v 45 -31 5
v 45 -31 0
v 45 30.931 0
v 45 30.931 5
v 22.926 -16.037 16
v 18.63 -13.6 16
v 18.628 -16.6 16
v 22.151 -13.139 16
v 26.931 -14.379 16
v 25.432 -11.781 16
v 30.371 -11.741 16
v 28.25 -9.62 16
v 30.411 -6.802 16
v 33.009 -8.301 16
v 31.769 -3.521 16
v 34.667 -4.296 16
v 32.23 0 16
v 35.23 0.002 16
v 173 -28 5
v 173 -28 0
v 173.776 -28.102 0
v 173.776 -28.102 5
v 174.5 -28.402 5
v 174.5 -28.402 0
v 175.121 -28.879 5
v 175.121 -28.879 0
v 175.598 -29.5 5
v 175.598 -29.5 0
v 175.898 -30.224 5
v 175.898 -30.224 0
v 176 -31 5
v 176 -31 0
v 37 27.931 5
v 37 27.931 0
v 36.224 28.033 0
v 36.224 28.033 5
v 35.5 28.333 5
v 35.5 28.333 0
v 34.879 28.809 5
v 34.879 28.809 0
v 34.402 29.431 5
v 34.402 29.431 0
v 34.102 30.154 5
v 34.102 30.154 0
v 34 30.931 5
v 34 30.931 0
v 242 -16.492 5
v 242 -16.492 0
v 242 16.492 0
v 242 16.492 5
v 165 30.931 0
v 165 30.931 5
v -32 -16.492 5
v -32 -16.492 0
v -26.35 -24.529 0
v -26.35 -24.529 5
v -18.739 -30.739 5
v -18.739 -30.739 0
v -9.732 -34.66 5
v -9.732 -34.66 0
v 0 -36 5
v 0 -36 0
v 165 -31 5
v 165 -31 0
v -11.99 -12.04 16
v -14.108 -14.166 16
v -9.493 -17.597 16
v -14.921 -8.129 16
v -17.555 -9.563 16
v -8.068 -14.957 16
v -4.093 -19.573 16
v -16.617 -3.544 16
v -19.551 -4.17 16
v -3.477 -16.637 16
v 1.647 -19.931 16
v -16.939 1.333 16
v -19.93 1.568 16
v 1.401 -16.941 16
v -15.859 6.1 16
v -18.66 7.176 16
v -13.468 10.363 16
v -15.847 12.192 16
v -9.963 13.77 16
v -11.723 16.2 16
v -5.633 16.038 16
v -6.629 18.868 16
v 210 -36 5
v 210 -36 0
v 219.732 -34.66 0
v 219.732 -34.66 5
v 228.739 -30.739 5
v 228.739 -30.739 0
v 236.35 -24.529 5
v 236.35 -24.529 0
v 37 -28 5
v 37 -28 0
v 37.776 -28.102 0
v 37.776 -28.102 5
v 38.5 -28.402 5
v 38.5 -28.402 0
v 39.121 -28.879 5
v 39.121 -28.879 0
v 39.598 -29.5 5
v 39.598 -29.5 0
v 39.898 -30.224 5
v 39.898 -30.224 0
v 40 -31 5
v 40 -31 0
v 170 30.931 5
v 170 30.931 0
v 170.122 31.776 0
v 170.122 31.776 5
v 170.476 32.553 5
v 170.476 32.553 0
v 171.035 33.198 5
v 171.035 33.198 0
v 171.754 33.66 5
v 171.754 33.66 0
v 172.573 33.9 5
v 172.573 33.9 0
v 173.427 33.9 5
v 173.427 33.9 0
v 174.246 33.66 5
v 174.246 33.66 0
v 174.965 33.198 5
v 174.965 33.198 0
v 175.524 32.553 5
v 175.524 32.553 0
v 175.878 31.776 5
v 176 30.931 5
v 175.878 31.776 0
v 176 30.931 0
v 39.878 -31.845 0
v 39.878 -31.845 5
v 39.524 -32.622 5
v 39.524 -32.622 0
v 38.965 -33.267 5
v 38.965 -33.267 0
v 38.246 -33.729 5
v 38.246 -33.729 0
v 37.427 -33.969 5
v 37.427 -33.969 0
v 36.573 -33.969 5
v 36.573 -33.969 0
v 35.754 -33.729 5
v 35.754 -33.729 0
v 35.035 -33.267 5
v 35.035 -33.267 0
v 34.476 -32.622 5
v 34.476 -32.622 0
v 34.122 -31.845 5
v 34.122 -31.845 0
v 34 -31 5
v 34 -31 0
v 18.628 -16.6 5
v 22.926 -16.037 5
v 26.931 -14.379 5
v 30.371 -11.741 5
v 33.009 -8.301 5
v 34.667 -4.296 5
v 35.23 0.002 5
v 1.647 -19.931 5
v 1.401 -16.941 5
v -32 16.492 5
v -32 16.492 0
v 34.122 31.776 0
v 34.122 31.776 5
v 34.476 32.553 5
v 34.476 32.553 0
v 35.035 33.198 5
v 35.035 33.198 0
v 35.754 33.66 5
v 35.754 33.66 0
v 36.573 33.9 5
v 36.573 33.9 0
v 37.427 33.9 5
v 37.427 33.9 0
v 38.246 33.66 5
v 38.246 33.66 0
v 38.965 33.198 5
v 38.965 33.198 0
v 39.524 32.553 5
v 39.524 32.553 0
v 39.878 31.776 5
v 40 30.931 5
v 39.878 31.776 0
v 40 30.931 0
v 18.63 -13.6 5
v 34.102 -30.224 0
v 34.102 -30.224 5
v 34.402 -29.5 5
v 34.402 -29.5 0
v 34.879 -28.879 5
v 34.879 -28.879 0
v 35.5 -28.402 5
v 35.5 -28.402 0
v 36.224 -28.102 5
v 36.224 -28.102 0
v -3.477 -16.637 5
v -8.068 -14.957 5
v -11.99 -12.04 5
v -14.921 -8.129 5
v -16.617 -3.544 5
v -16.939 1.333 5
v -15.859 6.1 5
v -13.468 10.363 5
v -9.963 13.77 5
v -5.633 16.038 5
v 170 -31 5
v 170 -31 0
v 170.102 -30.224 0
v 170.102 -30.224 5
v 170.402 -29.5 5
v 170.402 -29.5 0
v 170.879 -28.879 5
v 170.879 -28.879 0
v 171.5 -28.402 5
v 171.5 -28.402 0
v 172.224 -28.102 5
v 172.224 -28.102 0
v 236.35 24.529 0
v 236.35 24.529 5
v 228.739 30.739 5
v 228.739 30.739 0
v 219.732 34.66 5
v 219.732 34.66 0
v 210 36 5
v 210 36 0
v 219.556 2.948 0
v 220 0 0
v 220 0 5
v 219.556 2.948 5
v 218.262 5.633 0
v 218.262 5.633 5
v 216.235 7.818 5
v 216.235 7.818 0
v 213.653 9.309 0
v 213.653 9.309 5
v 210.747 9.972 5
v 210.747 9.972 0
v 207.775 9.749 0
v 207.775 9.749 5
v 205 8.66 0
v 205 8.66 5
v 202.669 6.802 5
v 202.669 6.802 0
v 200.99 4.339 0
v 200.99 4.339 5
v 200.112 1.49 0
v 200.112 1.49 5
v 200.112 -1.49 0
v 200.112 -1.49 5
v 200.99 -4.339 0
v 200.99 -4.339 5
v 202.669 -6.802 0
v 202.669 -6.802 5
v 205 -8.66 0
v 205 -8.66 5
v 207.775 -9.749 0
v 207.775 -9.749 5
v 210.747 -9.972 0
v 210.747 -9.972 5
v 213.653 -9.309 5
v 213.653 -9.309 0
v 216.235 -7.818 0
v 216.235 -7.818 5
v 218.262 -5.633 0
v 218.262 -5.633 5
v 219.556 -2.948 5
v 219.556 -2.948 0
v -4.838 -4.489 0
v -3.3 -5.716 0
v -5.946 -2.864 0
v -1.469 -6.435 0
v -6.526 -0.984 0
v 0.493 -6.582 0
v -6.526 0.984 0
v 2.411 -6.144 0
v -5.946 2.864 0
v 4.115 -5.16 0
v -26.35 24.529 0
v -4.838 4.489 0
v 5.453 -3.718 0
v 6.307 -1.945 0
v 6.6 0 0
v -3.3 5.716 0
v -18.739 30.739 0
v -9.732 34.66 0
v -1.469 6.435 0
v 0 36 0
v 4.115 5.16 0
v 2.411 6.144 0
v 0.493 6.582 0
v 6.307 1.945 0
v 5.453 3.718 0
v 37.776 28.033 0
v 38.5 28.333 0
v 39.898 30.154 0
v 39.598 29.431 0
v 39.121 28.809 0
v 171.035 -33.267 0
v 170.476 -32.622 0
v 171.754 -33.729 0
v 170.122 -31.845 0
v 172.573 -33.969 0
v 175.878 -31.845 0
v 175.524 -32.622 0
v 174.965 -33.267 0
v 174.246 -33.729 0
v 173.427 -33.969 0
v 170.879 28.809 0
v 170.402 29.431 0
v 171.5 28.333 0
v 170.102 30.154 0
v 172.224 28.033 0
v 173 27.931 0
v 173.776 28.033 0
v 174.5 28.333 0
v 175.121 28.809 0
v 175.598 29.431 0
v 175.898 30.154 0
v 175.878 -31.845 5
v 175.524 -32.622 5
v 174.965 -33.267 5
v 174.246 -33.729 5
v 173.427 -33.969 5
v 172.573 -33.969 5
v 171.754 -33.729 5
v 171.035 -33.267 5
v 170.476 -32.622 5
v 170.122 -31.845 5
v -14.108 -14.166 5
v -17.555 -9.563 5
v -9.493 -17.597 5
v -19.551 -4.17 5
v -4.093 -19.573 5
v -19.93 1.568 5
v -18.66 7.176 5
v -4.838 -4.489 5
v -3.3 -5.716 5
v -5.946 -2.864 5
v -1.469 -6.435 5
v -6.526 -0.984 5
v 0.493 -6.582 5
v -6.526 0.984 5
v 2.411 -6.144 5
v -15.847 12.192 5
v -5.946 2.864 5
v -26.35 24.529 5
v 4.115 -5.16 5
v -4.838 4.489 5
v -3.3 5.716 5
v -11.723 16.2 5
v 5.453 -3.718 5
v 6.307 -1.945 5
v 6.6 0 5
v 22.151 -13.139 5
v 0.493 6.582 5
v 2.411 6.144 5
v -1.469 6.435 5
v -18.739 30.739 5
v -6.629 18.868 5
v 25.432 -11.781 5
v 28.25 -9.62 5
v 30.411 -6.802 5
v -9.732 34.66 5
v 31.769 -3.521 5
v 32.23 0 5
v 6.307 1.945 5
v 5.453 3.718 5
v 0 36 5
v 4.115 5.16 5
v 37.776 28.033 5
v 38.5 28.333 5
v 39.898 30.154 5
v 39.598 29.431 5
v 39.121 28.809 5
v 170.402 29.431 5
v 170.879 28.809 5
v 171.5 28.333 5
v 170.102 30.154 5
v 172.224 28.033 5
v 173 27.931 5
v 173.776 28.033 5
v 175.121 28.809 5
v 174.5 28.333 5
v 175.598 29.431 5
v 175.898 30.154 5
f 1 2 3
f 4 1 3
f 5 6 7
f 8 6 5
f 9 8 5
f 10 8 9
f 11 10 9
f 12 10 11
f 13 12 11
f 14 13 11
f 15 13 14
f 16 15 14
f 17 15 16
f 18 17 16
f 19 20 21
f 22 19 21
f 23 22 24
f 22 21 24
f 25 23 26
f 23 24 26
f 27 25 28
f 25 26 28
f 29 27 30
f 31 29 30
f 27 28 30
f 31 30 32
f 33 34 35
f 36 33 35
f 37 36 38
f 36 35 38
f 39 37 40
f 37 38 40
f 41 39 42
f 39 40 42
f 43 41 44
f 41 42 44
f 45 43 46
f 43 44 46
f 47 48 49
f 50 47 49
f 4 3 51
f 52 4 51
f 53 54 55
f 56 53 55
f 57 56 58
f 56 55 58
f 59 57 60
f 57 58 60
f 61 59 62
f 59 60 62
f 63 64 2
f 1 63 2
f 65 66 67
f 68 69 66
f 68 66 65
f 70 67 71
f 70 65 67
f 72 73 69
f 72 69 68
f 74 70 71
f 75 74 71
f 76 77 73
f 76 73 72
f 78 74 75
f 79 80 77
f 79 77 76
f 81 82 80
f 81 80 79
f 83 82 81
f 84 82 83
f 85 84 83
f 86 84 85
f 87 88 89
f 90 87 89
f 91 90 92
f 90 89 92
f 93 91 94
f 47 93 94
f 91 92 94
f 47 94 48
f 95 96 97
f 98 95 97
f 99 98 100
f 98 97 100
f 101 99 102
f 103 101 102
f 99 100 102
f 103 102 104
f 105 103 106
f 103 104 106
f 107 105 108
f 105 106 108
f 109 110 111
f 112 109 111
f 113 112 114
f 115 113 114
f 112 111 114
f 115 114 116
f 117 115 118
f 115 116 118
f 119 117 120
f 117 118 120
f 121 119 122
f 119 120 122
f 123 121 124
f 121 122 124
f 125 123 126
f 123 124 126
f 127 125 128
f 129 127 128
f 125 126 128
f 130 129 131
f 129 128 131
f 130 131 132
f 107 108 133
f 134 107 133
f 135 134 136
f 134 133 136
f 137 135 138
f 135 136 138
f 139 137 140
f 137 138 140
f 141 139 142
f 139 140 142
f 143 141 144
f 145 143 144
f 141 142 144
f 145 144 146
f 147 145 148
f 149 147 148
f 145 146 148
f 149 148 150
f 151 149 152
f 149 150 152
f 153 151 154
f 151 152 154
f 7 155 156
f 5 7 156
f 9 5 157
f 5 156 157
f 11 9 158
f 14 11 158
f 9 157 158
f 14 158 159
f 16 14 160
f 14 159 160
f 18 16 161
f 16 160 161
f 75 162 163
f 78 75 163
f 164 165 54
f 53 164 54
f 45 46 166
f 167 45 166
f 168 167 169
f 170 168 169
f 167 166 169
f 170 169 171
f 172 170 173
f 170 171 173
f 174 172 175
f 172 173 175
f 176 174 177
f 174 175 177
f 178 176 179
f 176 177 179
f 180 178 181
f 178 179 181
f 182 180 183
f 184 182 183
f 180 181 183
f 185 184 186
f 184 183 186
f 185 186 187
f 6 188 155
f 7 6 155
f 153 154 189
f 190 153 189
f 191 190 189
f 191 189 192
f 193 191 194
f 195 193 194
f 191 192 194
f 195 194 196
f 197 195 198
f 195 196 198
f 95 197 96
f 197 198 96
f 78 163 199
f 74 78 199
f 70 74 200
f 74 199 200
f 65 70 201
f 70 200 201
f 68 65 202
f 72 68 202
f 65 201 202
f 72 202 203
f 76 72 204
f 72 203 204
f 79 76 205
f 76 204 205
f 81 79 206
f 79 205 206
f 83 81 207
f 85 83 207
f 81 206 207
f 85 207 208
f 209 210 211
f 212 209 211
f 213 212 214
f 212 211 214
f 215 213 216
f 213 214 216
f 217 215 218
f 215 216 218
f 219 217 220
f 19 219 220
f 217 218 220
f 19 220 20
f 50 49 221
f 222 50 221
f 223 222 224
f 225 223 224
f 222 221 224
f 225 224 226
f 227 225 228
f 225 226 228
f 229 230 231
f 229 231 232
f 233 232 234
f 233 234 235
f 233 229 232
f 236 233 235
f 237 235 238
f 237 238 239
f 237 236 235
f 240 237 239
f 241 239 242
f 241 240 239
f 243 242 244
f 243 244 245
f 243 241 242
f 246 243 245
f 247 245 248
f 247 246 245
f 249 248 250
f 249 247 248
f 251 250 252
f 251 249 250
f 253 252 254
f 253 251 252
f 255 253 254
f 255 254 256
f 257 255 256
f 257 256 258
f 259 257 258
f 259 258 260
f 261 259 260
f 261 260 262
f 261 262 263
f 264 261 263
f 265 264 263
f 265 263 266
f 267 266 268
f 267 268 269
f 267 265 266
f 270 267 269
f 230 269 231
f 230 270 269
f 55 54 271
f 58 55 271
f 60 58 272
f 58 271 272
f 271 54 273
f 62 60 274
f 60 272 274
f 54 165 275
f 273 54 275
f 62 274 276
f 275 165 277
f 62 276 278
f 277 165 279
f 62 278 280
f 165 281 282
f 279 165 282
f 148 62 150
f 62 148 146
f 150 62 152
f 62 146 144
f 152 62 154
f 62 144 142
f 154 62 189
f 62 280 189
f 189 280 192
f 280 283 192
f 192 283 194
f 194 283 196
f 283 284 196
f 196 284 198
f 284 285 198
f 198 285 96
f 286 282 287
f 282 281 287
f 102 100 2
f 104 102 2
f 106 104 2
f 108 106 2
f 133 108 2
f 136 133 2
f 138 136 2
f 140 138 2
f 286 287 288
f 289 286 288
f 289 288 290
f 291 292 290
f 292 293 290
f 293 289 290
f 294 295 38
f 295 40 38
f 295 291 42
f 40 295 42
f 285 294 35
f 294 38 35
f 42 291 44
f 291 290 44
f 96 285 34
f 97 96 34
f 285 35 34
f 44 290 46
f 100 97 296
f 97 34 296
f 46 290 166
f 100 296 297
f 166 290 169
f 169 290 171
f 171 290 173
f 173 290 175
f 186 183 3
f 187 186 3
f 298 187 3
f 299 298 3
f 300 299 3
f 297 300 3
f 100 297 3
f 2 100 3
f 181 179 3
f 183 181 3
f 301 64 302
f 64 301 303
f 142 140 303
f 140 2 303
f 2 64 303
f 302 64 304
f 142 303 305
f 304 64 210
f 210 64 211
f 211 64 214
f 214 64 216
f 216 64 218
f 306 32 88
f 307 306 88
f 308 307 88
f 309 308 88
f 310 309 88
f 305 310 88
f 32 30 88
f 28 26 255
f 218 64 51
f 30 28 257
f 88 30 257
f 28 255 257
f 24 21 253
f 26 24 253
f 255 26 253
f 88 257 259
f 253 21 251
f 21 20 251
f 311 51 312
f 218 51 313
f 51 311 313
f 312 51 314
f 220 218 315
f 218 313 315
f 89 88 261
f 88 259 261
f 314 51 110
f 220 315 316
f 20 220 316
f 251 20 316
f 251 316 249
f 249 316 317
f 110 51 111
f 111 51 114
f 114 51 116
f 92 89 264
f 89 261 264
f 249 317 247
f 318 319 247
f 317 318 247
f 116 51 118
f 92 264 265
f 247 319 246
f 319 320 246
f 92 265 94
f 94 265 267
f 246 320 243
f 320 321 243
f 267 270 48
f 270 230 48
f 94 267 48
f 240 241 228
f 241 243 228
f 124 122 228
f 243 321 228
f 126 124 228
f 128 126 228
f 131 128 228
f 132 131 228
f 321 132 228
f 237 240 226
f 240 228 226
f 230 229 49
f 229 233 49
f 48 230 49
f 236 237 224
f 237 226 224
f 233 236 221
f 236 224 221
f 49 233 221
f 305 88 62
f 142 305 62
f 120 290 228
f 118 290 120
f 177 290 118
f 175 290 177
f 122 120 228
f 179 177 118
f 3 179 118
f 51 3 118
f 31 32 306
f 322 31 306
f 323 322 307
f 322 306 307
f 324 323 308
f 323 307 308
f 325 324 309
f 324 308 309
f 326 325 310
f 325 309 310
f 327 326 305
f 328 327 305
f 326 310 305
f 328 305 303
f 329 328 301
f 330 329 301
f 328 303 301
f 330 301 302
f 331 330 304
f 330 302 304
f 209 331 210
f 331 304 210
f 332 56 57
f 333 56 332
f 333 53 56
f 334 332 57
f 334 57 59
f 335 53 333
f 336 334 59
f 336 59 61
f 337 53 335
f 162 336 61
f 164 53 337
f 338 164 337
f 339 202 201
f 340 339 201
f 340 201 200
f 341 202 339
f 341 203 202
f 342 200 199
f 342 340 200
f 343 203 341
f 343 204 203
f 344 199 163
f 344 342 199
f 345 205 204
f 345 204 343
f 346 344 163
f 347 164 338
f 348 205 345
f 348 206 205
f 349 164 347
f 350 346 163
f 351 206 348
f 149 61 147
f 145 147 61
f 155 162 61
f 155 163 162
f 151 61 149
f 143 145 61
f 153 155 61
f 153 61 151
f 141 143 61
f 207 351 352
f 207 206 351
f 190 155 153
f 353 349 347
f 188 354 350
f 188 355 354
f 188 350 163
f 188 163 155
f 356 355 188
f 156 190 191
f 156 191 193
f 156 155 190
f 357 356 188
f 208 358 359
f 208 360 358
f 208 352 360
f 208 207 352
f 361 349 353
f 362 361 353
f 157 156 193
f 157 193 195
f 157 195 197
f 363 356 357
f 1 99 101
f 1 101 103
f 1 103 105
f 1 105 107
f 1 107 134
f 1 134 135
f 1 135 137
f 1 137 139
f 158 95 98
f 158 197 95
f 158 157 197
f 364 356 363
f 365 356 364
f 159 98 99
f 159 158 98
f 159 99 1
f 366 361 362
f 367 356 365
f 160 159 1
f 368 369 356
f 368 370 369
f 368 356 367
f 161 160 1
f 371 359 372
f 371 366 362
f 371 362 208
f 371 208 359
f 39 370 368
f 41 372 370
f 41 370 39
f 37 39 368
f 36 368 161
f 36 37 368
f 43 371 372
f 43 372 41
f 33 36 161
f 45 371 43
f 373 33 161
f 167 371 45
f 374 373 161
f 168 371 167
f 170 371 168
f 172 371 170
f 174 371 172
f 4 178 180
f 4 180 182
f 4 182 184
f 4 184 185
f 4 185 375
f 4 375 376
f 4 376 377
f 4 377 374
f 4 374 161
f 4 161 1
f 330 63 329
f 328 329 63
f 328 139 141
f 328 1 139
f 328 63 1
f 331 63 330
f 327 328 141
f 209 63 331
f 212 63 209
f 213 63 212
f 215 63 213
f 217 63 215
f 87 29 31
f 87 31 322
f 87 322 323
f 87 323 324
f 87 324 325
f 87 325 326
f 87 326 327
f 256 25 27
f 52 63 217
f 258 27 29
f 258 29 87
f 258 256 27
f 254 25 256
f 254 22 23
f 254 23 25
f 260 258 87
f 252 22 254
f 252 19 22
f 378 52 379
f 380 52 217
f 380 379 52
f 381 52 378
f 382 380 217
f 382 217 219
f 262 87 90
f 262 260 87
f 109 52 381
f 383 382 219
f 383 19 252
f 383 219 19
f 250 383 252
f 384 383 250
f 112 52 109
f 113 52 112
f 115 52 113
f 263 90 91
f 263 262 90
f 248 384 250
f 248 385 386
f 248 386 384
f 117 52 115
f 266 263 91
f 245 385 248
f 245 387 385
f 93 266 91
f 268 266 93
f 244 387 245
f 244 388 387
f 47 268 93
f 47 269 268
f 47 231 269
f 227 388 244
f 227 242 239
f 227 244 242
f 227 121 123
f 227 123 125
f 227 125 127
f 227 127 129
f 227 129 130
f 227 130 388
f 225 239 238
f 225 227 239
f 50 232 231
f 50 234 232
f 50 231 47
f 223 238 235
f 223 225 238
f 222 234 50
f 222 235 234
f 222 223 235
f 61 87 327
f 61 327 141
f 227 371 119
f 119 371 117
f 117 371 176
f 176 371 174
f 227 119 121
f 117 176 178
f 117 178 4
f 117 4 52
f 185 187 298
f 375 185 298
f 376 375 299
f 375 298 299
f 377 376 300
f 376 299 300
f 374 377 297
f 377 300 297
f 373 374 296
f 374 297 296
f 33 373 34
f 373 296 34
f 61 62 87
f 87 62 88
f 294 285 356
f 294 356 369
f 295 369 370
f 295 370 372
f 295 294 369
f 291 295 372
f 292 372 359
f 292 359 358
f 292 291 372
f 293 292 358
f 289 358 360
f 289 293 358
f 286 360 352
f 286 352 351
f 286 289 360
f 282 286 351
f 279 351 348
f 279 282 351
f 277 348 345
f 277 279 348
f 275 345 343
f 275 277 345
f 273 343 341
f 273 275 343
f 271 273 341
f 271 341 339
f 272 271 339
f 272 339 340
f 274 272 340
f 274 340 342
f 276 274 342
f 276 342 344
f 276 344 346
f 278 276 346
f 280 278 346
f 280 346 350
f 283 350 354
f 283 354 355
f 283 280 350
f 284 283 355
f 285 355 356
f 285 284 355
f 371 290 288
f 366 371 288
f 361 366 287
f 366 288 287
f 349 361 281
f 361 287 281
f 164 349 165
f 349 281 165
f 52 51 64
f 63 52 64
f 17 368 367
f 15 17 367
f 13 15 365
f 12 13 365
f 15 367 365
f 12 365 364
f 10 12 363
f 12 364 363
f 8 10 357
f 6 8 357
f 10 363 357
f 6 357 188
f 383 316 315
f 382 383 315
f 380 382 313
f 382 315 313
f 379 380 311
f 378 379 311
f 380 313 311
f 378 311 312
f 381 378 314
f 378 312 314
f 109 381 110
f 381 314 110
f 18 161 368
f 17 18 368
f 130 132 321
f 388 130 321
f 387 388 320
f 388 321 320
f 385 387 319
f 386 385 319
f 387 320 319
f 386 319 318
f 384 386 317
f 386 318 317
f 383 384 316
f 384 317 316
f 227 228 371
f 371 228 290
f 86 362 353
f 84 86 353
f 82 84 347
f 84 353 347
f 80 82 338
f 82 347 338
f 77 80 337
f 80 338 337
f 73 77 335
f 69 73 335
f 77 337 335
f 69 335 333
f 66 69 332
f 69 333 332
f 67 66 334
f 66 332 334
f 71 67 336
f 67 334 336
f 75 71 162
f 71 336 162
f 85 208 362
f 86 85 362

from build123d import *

# Parameters (mm, degrees)
F0_R     = 30
F0_R_2   = 10
F0_R_3   = 14
F0_R_4   = 6.6
F1_DEPTH = 5
F3_DEPTH = 11


with BuildPart() as f1:
    # F0 (on Top) → F1 (new body)
    with BuildSketch(Plane.XY):
        with BuildLine():
            ThreePointArc((18.3030052177, -31), (31.2642622481, -17.8478543831), (36, 0))
            ThreePointArc((36, 0), (31.2978497092, 17.7888898917), (18.4197442455, 30.9307779069))
            ThreePointArc((18.4197442455, 30.9307779069), (9.5522770937, 34.7095664382), (0, 36))
            ThreePointArc((0, 36), (-18.7386337537, 30.7386337537), (-32, 16.4924225025))
            Line((-32, 16.4924225025), (-32, -16.4924225025))
            ThreePointArc((-32, -16.4924225025), (-18.7386337537, -30.7386337537), (0, -36))
            ThreePointArc((0, -36), (9.4868329805, -34.7275107084), (18.3030052177, -31))
        make_face()
        Circle(F0_R, mode=Mode.SUBTRACT)
        with BuildLine():
            ThreePointArc((242, 16.4924225025), (228.7386337537, 30.7386337537), (210, 36))
            ThreePointArc((210, 36), (200.4477229063, 34.7095664382), (191.5802557545, 30.9307779069))
            ThreePointArc((191.5802557545, 30.9307779069), (174.0000639573, -0.0678595955), (191.6969947823, -31))
            ThreePointArc((191.6969947823, -31), (200.5131670195, -34.7275107084), (210, -36))
            ThreePointArc((210, -36), (228.7386337537, -30.7386337537), (242, -16.4924225025))
            Line((242, -16.4924225025), (242, 16.4924225025))
        make_face()
        with Locations((210, 0)):
            Circle(F0_R, mode=Mode.SUBTRACT)
        Circle(F0_R)
        Circle(F0_R_2, mode=Mode.SUBTRACT)
        with Locations((210, 0)):
            Circle(F0_R)
        with Locations((210, 0)):
            Circle(F0_R_3, mode=Mode.SUBTRACT)
        with BuildLine():
            ThreePointArc((19.6214168703, 36), (23.4046464655, 33.6633706545), (26.9125802938, 30.9307779069))
            Line((26.9125802938, 30.9307779069), (34, 30.9307779069))
            ThreePointArc((34, 30.9307779069), (37, 33.9307779069), (40, 30.9307779069))
            Line((40, 30.9307779069), (45, 30.9307779069))
            Line((45, 30.9307779069), (165, 30.9307779069))
            Line((165, 30.9307779069), (170, 30.9307779069))
            ThreePointArc((170, 30.9307779069), (173, 33.9307779069), (176, 30.9307779069))
            Line((176, 30.9307779069), (183.0874197062, 30.9307779069))
            ThreePointArc((183.0874197062, 30.9307779069), (186.5953535345, 33.6633706545), (190.3785831296, 36))
            Line((190.3785831296, 36), (19.6214168703, 36))
        make_face()
        with BuildLine():
            Line((34, -31), (26.83281573, -31))
            ThreePointArc((26.83281573, -31), (23.361269906, -33.693487032), (19.6214168703, -36))
            Line((19.6214168703, -36), (190.3785831296, -36))
            ThreePointArc((190.3785831296, -36), (186.638730094, -33.693487032), (183.16718427, -31))
            Line((183.16718427, -31), (176, -31))
            ThreePointArc((176, -31), (173, -34), (170, -31))
            Line((170, -31), (165, -31))
            Line((165, -31), (45, -31))
            Line((45, -31), (40, -31))
            ThreePointArc((40, -31), (37, -34), (34, -31))
        make_face()
        with Locations((210, 0)):
            Circle(F0_R_3)
        with Locations((210, 0)):
            Circle(F0_R_2, mode=Mode.SUBTRACT)
        with BuildLine():
            Line((37, 27.9307779069), (37, 17.6635217327))
            ThreePointArc((37, 17.6635217327), (39.9874980463, 9.0553851381), (41, 0))
            ThreePointArc((41, 0), (39.9874980463, -9.0553851381), (37, -17.6635217327))
            Line((37, -17.6635217327), (37, -28))
            ThreePointArc((37, -28), (39.1213203436, -28.8786796564), (40, -31))
            Line((40, -31), (45, -31))
            Line((45, -31), (45, 30.9307779069))
            Line((45, 30.9307779069), (40, 30.9307779069))
            ThreePointArc((40, 30.9307779069), (39.1213203436, 28.8094575634), (37, 27.9307779069))
        make_face()
        with BuildLine():
            ThreePointArc((173, -17.6635217327), (169, 0), (173, 17.6635217327))
            Line((173, 17.6635217327), (173, 27.9307779069))
            ThreePointArc((173, 27.9307779069), (170.8786796564, 28.8094575634), (170, 30.9307779069))
            Line((170, 30.9307779069), (165, 30.9307779069))
            Line((165, 30.9307779069), (165, -31))
            Line((165, -31), (170, -31))
            ThreePointArc((170, -31), (170.8786796564, -28.8786796564), (173, -28))
            Line((173, -28), (173, -17.6635217327))
        make_face()
        Circle(F0_R_2)
        Circle(F0_R_4, mode=Mode.SUBTRACT)
        with BuildLine():
            ThreePointArc((18.4197442455, 30.9307779069), (31.2978497092, 17.7888898917), (36, 0))
            ThreePointArc((36, 0), (31.2642622481, -17.8478543831), (18.3030052177, -31))
            Line((18.3030052177, -31), (26.83281573, -31))
            ThreePointArc((26.83281573, -31), (32.6055594055, -24.8571417474), (37, -17.6635217327))
            Line((37, -17.6635217327), (37, 17.6635217327))
            ThreePointArc((37, 17.6635217327), (32.6375474194, 24.815126404), (26.9125802938, 30.9307779069))
            Line((26.9125802938, 30.9307779069), (18.4197442455, 30.9307779069))
        make_face()
        with BuildLine():
            Line((191.5802557545, 30.9307779069), (183.0874197062, 30.9307779069))
            ThreePointArc((183.0874197062, 30.9307779069), (177.3624525806, 24.815126404), (173, 17.6635217327))
            Line((173, 17.6635217327), (173, -17.6635217327))
            ThreePointArc((173, -17.6635217327), (177.3944405945, -24.8571417474), (183.16718427, -31))
            Line((183.16718427, -31), (191.6969947823, -31))
            ThreePointArc((191.6969947823, -31), (174.0000639573, -0.0678595955), (191.5802557545, 30.9307779069))
        make_face()
        with BuildLine():
            ThreePointArc((41, 0), (39.9874980463, 9.0553851381), (37, 17.6635217327))
            Line((37, 17.6635217327), (37, -17.6635217327))
            ThreePointArc((37, -17.6635217327), (39.9874980463, -9.0553851381), (41, 0))
        make_face()
        with BuildLine():
            Line((173, -17.6635217327), (173, 17.6635217327))
            ThreePointArc((173, 17.6635217327), (169, 0), (173, -17.6635217327))
        make_face()
        with BuildLine():
            ThreePointArc((0, 36), (9.5522770937, 34.7095664382), (18.4197442455, 30.9307779069))
            Line((18.4197442455, 30.9307779069), (26.9125802938, 30.9307779069))
            ThreePointArc((26.9125802938, 30.9307779069), (23.4046464655, 33.6633706545), (19.6214168703, 36))
            Line((19.6214168703, 36), (0, 36))
        make_face()
        with BuildLine():
            Line((210, 36), (190.3785831296, 36))
            ThreePointArc((190.3785831296, 36), (186.5953535345, 33.6633706545), (183.0874197062, 30.9307779069))
            Line((183.0874197062, 30.9307779069), (191.5802557545, 30.9307779069))
            ThreePointArc((191.5802557545, 30.9307779069), (200.4477229063, 34.7095664382), (210, 36))
        make_face()
        with BuildLine():
            Line((26.83281573, -31), (18.3030052177, -31))
            ThreePointArc((18.3030052177, -31), (9.4868329805, -34.7275107084), (0, -36))
            Line((0, -36), (19.6214168703, -36))
            ThreePointArc((19.6214168703, -36), (23.361269906, -33.693487032), (26.83281573, -31))
        make_face()
        with BuildLine():
            ThreePointArc((183.16718427, -31), (186.638730094, -33.693487032), (190.3785831296, -36))
            Line((190.3785831296, -36), (210, -36))
            ThreePointArc((210, -36), (200.5131670195, -34.7275107084), (191.6969947823, -31))
            Line((191.6969947823, -31), (183.16718427, -31))
        make_face()
        with BuildLine():
            ThreePointArc((37, -17.6635217327), (32.6055594055, -24.8571417474), (26.83281573, -31))
            Line((26.83281573, -31), (34, -31))
            ThreePointArc((34, -31), (34.8786796564, -28.8786796564), (37, -28))
            Line((37, -28), (37, -17.6635217327))
        make_face()
        with BuildLine():
            Line((176, -31), (183.16718427, -31))
            ThreePointArc((183.16718427, -31), (177.3944405945, -24.8571417474), (173, -17.6635217327))
            Line((173, -17.6635217327), (173, -28))
            ThreePointArc((173, -28), (175.1213203436, -28.8786796564), (176, -31))
        make_face()
        with BuildLine():
            Line((34, 30.9307779069), (26.9125802938, 30.9307779069))
            ThreePointArc((26.9125802938, 30.9307779069), (32.6375474194, 24.815126404), (37, 17.6635217327))
            Line((37, 17.6635217327), (37, 27.9307779069))
            ThreePointArc((37, 27.9307779069), (34.8786796564, 28.8094575634), (34, 30.9307779069))
        make_face()
        with BuildLine():
            ThreePointArc((173, 17.6635217327), (177.3624525806, 24.815126404), (183.0874197062, 30.9307779069))
            Line((183.0874197062, 30.9307779069), (176, 30.9307779069))
            ThreePointArc((176, 30.9307779069), (175.1213203436, 28.8094575634), (173, 27.9307779069))
            Line((173, 27.9307779069), (173, 17.6635217327))
        make_face()
    extrude(amount=F1_DEPTH)

    # F2 (on face) → F3 (join)
    with BuildSketch(Plane.XY.offset(5)):
        with BuildLine():
            ThreePointArc((32.2300370842, 0), (28.249548951, -9.6195118668), (18.6300370842, -13.6))
            Line((18.6300370842, -13.6), (18.6278837067, -16.5999992272))
            ThreePointArc((18.6278837067, -16.5999992272), (30.3708692945, -11.7408322103), (35.2300363114, 0.0021533775))
            Line((35.2300363114, 0.0021533775), (32.2300370842, 0))
        make_face()
        with BuildLine():
            ThreePointArc((1.4010723087, -16.9409777332), (-16.6169103502, -3.544385222), (-5.6333881929, 16.0382252023))
            Line((-5.6333881929, 16.0382252023), (-6.6291181037, 18.8681584073))
            ThreePointArc((-6.6291181037, 18.8681584073), (-19.550908877, -4.1702067977), (1.6467177805, -19.9309038698))
            Line((1.6467177805, -19.9309038698), (1.4010723087, -16.9409777332))
        make_face()
    extrude(amount=F3_DEPTH)


solid = f1.part
